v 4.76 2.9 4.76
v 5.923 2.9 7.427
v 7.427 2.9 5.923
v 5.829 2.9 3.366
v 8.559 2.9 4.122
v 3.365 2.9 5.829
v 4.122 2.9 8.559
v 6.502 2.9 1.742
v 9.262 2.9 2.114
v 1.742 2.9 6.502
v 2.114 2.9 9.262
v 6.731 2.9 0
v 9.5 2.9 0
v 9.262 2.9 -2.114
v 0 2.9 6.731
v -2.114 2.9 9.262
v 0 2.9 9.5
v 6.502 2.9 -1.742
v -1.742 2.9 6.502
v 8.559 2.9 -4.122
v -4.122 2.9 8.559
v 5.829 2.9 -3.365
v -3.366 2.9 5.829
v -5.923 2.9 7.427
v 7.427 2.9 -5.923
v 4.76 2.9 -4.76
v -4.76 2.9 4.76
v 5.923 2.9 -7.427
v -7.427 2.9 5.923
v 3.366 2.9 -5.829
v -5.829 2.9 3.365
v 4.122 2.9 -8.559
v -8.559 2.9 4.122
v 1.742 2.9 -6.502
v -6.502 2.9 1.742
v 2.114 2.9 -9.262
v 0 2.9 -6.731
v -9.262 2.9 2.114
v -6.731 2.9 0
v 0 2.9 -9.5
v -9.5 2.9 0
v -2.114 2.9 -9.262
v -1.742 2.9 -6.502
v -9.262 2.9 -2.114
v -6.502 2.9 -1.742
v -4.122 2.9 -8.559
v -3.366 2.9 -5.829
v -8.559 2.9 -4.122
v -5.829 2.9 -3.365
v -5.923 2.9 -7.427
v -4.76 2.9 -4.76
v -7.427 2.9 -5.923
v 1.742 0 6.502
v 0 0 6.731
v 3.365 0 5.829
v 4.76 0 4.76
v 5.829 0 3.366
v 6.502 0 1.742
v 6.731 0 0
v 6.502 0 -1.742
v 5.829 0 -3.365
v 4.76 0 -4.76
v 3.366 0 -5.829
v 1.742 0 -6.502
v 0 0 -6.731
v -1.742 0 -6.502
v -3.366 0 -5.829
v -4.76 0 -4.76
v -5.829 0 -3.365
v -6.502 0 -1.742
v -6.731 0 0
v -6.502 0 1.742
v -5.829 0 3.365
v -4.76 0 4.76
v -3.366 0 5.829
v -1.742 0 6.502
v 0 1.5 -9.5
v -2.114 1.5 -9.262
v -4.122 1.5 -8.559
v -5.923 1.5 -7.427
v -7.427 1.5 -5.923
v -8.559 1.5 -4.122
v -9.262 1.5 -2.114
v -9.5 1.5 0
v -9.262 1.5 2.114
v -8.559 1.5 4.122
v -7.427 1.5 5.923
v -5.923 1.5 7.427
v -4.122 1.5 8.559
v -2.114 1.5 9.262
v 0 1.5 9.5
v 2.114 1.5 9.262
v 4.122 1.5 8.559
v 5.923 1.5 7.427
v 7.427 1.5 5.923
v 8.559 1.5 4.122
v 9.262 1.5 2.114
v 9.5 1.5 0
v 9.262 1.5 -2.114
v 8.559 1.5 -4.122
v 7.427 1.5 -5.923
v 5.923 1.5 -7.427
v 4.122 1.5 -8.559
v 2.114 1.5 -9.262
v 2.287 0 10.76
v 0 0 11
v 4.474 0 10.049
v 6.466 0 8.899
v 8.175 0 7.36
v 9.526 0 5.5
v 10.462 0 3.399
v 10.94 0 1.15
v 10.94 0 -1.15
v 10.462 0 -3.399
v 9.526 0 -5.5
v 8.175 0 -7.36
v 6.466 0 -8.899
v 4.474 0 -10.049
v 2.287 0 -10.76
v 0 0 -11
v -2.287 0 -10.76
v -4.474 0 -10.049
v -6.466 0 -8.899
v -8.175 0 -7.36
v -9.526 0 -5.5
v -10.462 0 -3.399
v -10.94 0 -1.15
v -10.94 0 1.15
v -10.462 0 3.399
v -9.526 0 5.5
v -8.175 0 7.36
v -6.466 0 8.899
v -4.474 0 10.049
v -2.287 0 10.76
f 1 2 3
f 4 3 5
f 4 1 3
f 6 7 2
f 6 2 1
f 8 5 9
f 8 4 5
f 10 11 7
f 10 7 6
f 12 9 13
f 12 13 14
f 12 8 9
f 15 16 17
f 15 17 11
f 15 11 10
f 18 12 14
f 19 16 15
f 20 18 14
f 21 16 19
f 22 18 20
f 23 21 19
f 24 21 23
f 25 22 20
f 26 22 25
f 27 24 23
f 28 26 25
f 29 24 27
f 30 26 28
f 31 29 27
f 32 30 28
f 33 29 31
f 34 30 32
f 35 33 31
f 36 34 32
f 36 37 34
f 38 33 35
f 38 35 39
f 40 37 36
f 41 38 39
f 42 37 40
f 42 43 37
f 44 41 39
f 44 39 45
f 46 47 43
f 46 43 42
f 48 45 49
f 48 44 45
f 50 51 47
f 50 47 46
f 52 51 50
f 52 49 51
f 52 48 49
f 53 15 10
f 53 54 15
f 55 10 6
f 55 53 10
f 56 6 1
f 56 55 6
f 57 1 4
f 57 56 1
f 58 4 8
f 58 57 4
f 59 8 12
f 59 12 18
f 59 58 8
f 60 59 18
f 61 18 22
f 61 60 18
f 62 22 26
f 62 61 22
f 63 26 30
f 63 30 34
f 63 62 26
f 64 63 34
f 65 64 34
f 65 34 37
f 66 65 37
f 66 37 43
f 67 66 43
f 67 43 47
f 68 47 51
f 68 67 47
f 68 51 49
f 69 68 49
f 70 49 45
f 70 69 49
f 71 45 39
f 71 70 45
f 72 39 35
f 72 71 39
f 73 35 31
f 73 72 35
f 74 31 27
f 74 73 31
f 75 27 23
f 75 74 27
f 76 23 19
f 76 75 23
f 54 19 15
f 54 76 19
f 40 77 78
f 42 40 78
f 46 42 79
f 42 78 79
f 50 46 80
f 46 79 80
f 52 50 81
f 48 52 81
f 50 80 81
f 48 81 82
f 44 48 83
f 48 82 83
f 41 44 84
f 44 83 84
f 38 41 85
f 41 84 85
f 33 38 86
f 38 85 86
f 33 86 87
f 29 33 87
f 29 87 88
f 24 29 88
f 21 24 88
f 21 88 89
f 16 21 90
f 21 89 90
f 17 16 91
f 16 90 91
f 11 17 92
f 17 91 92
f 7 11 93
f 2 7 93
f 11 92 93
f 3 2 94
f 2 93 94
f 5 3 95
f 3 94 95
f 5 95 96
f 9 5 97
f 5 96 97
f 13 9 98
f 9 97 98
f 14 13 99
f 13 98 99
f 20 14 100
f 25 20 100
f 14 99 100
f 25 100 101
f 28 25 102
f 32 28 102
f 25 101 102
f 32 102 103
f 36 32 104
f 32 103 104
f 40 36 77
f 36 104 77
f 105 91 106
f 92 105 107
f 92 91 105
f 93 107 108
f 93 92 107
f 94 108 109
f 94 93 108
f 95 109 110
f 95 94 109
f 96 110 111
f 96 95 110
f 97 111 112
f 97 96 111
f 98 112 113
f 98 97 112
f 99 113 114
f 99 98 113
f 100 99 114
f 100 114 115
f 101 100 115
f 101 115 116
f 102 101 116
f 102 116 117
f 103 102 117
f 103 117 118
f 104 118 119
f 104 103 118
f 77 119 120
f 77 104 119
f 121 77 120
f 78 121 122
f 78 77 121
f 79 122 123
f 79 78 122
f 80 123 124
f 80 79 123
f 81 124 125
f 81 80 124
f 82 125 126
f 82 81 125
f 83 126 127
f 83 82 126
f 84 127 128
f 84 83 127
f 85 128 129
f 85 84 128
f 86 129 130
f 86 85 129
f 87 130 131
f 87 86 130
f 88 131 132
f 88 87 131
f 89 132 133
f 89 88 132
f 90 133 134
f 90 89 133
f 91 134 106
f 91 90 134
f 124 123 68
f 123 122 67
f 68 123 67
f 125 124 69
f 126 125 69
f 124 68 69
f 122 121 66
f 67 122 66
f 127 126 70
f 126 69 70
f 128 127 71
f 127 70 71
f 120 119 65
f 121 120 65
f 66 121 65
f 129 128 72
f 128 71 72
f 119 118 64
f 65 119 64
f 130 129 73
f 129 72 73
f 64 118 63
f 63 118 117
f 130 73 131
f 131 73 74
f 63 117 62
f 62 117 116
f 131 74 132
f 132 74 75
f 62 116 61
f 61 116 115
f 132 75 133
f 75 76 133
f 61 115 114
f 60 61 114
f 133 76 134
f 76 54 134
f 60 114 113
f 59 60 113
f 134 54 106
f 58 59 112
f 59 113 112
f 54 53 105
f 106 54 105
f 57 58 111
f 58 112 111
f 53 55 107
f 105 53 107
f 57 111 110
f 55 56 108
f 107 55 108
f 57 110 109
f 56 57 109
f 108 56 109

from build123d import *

# Parameters (mm, degrees)
SKETCH1_R           = 11
SKETCH1_R_2         = 6.731
BOSS_EXTRUDE1_DEPTH = 1.5
CHAMFER1_SIZE       = 1.5
SKETCH2_R           = 9.5
SKETCH2_R_2         = 6.731
BOSS_EXTRUDE2_DEPTH = 1.4


with BuildPart() as part:
    # Sketch1 → Boss-Extrude1 (new body)
    with BuildSketch(Plane(origin=(0, 0, 0), x_dir=(1, 0, 0), z_dir=(0, 1, 0))):
        with Locations(Location((0, 0, 0), (0, 0, 270))):
            Circle(SKETCH1_R)
        with Locations(Location((0, 0, 0), (0, 0, 270))):
            Circle(SKETCH1_R_2, mode=Mode.SUBTRACT)
    extrude(amount=BOSS_EXTRUDE1_DEPTH)

    # Chamfer1
    chamfer1_edges = [part.edges().sort_by_distance(p)[0] for p in [
        (0, 1.5, -11),
    ]]
    chamfer(chamfer1_edges, length=CHAMFER1_SIZE - 0.0001)  # a hair under: the kernel refuses the full size

    # Sketch2 → Boss-Extrude2 (add)
    with BuildSketch(Plane(origin=(0, 1.5, 0), x_dir=(1, 0, 0), z_dir=(0, 1, 0))):
        with Locations(Location((0, 0, 0), (0, 0, 90))):
            Circle(SKETCH2_R)
        with Locations(Location((0, 0, 0), (0, 0, 270))):
            Circle(SKETCH2_R_2, mode=Mode.SUBTRACT)
    extrude(amount=BOSS_EXTRUDE2_DEPTH)


solid = part.part
